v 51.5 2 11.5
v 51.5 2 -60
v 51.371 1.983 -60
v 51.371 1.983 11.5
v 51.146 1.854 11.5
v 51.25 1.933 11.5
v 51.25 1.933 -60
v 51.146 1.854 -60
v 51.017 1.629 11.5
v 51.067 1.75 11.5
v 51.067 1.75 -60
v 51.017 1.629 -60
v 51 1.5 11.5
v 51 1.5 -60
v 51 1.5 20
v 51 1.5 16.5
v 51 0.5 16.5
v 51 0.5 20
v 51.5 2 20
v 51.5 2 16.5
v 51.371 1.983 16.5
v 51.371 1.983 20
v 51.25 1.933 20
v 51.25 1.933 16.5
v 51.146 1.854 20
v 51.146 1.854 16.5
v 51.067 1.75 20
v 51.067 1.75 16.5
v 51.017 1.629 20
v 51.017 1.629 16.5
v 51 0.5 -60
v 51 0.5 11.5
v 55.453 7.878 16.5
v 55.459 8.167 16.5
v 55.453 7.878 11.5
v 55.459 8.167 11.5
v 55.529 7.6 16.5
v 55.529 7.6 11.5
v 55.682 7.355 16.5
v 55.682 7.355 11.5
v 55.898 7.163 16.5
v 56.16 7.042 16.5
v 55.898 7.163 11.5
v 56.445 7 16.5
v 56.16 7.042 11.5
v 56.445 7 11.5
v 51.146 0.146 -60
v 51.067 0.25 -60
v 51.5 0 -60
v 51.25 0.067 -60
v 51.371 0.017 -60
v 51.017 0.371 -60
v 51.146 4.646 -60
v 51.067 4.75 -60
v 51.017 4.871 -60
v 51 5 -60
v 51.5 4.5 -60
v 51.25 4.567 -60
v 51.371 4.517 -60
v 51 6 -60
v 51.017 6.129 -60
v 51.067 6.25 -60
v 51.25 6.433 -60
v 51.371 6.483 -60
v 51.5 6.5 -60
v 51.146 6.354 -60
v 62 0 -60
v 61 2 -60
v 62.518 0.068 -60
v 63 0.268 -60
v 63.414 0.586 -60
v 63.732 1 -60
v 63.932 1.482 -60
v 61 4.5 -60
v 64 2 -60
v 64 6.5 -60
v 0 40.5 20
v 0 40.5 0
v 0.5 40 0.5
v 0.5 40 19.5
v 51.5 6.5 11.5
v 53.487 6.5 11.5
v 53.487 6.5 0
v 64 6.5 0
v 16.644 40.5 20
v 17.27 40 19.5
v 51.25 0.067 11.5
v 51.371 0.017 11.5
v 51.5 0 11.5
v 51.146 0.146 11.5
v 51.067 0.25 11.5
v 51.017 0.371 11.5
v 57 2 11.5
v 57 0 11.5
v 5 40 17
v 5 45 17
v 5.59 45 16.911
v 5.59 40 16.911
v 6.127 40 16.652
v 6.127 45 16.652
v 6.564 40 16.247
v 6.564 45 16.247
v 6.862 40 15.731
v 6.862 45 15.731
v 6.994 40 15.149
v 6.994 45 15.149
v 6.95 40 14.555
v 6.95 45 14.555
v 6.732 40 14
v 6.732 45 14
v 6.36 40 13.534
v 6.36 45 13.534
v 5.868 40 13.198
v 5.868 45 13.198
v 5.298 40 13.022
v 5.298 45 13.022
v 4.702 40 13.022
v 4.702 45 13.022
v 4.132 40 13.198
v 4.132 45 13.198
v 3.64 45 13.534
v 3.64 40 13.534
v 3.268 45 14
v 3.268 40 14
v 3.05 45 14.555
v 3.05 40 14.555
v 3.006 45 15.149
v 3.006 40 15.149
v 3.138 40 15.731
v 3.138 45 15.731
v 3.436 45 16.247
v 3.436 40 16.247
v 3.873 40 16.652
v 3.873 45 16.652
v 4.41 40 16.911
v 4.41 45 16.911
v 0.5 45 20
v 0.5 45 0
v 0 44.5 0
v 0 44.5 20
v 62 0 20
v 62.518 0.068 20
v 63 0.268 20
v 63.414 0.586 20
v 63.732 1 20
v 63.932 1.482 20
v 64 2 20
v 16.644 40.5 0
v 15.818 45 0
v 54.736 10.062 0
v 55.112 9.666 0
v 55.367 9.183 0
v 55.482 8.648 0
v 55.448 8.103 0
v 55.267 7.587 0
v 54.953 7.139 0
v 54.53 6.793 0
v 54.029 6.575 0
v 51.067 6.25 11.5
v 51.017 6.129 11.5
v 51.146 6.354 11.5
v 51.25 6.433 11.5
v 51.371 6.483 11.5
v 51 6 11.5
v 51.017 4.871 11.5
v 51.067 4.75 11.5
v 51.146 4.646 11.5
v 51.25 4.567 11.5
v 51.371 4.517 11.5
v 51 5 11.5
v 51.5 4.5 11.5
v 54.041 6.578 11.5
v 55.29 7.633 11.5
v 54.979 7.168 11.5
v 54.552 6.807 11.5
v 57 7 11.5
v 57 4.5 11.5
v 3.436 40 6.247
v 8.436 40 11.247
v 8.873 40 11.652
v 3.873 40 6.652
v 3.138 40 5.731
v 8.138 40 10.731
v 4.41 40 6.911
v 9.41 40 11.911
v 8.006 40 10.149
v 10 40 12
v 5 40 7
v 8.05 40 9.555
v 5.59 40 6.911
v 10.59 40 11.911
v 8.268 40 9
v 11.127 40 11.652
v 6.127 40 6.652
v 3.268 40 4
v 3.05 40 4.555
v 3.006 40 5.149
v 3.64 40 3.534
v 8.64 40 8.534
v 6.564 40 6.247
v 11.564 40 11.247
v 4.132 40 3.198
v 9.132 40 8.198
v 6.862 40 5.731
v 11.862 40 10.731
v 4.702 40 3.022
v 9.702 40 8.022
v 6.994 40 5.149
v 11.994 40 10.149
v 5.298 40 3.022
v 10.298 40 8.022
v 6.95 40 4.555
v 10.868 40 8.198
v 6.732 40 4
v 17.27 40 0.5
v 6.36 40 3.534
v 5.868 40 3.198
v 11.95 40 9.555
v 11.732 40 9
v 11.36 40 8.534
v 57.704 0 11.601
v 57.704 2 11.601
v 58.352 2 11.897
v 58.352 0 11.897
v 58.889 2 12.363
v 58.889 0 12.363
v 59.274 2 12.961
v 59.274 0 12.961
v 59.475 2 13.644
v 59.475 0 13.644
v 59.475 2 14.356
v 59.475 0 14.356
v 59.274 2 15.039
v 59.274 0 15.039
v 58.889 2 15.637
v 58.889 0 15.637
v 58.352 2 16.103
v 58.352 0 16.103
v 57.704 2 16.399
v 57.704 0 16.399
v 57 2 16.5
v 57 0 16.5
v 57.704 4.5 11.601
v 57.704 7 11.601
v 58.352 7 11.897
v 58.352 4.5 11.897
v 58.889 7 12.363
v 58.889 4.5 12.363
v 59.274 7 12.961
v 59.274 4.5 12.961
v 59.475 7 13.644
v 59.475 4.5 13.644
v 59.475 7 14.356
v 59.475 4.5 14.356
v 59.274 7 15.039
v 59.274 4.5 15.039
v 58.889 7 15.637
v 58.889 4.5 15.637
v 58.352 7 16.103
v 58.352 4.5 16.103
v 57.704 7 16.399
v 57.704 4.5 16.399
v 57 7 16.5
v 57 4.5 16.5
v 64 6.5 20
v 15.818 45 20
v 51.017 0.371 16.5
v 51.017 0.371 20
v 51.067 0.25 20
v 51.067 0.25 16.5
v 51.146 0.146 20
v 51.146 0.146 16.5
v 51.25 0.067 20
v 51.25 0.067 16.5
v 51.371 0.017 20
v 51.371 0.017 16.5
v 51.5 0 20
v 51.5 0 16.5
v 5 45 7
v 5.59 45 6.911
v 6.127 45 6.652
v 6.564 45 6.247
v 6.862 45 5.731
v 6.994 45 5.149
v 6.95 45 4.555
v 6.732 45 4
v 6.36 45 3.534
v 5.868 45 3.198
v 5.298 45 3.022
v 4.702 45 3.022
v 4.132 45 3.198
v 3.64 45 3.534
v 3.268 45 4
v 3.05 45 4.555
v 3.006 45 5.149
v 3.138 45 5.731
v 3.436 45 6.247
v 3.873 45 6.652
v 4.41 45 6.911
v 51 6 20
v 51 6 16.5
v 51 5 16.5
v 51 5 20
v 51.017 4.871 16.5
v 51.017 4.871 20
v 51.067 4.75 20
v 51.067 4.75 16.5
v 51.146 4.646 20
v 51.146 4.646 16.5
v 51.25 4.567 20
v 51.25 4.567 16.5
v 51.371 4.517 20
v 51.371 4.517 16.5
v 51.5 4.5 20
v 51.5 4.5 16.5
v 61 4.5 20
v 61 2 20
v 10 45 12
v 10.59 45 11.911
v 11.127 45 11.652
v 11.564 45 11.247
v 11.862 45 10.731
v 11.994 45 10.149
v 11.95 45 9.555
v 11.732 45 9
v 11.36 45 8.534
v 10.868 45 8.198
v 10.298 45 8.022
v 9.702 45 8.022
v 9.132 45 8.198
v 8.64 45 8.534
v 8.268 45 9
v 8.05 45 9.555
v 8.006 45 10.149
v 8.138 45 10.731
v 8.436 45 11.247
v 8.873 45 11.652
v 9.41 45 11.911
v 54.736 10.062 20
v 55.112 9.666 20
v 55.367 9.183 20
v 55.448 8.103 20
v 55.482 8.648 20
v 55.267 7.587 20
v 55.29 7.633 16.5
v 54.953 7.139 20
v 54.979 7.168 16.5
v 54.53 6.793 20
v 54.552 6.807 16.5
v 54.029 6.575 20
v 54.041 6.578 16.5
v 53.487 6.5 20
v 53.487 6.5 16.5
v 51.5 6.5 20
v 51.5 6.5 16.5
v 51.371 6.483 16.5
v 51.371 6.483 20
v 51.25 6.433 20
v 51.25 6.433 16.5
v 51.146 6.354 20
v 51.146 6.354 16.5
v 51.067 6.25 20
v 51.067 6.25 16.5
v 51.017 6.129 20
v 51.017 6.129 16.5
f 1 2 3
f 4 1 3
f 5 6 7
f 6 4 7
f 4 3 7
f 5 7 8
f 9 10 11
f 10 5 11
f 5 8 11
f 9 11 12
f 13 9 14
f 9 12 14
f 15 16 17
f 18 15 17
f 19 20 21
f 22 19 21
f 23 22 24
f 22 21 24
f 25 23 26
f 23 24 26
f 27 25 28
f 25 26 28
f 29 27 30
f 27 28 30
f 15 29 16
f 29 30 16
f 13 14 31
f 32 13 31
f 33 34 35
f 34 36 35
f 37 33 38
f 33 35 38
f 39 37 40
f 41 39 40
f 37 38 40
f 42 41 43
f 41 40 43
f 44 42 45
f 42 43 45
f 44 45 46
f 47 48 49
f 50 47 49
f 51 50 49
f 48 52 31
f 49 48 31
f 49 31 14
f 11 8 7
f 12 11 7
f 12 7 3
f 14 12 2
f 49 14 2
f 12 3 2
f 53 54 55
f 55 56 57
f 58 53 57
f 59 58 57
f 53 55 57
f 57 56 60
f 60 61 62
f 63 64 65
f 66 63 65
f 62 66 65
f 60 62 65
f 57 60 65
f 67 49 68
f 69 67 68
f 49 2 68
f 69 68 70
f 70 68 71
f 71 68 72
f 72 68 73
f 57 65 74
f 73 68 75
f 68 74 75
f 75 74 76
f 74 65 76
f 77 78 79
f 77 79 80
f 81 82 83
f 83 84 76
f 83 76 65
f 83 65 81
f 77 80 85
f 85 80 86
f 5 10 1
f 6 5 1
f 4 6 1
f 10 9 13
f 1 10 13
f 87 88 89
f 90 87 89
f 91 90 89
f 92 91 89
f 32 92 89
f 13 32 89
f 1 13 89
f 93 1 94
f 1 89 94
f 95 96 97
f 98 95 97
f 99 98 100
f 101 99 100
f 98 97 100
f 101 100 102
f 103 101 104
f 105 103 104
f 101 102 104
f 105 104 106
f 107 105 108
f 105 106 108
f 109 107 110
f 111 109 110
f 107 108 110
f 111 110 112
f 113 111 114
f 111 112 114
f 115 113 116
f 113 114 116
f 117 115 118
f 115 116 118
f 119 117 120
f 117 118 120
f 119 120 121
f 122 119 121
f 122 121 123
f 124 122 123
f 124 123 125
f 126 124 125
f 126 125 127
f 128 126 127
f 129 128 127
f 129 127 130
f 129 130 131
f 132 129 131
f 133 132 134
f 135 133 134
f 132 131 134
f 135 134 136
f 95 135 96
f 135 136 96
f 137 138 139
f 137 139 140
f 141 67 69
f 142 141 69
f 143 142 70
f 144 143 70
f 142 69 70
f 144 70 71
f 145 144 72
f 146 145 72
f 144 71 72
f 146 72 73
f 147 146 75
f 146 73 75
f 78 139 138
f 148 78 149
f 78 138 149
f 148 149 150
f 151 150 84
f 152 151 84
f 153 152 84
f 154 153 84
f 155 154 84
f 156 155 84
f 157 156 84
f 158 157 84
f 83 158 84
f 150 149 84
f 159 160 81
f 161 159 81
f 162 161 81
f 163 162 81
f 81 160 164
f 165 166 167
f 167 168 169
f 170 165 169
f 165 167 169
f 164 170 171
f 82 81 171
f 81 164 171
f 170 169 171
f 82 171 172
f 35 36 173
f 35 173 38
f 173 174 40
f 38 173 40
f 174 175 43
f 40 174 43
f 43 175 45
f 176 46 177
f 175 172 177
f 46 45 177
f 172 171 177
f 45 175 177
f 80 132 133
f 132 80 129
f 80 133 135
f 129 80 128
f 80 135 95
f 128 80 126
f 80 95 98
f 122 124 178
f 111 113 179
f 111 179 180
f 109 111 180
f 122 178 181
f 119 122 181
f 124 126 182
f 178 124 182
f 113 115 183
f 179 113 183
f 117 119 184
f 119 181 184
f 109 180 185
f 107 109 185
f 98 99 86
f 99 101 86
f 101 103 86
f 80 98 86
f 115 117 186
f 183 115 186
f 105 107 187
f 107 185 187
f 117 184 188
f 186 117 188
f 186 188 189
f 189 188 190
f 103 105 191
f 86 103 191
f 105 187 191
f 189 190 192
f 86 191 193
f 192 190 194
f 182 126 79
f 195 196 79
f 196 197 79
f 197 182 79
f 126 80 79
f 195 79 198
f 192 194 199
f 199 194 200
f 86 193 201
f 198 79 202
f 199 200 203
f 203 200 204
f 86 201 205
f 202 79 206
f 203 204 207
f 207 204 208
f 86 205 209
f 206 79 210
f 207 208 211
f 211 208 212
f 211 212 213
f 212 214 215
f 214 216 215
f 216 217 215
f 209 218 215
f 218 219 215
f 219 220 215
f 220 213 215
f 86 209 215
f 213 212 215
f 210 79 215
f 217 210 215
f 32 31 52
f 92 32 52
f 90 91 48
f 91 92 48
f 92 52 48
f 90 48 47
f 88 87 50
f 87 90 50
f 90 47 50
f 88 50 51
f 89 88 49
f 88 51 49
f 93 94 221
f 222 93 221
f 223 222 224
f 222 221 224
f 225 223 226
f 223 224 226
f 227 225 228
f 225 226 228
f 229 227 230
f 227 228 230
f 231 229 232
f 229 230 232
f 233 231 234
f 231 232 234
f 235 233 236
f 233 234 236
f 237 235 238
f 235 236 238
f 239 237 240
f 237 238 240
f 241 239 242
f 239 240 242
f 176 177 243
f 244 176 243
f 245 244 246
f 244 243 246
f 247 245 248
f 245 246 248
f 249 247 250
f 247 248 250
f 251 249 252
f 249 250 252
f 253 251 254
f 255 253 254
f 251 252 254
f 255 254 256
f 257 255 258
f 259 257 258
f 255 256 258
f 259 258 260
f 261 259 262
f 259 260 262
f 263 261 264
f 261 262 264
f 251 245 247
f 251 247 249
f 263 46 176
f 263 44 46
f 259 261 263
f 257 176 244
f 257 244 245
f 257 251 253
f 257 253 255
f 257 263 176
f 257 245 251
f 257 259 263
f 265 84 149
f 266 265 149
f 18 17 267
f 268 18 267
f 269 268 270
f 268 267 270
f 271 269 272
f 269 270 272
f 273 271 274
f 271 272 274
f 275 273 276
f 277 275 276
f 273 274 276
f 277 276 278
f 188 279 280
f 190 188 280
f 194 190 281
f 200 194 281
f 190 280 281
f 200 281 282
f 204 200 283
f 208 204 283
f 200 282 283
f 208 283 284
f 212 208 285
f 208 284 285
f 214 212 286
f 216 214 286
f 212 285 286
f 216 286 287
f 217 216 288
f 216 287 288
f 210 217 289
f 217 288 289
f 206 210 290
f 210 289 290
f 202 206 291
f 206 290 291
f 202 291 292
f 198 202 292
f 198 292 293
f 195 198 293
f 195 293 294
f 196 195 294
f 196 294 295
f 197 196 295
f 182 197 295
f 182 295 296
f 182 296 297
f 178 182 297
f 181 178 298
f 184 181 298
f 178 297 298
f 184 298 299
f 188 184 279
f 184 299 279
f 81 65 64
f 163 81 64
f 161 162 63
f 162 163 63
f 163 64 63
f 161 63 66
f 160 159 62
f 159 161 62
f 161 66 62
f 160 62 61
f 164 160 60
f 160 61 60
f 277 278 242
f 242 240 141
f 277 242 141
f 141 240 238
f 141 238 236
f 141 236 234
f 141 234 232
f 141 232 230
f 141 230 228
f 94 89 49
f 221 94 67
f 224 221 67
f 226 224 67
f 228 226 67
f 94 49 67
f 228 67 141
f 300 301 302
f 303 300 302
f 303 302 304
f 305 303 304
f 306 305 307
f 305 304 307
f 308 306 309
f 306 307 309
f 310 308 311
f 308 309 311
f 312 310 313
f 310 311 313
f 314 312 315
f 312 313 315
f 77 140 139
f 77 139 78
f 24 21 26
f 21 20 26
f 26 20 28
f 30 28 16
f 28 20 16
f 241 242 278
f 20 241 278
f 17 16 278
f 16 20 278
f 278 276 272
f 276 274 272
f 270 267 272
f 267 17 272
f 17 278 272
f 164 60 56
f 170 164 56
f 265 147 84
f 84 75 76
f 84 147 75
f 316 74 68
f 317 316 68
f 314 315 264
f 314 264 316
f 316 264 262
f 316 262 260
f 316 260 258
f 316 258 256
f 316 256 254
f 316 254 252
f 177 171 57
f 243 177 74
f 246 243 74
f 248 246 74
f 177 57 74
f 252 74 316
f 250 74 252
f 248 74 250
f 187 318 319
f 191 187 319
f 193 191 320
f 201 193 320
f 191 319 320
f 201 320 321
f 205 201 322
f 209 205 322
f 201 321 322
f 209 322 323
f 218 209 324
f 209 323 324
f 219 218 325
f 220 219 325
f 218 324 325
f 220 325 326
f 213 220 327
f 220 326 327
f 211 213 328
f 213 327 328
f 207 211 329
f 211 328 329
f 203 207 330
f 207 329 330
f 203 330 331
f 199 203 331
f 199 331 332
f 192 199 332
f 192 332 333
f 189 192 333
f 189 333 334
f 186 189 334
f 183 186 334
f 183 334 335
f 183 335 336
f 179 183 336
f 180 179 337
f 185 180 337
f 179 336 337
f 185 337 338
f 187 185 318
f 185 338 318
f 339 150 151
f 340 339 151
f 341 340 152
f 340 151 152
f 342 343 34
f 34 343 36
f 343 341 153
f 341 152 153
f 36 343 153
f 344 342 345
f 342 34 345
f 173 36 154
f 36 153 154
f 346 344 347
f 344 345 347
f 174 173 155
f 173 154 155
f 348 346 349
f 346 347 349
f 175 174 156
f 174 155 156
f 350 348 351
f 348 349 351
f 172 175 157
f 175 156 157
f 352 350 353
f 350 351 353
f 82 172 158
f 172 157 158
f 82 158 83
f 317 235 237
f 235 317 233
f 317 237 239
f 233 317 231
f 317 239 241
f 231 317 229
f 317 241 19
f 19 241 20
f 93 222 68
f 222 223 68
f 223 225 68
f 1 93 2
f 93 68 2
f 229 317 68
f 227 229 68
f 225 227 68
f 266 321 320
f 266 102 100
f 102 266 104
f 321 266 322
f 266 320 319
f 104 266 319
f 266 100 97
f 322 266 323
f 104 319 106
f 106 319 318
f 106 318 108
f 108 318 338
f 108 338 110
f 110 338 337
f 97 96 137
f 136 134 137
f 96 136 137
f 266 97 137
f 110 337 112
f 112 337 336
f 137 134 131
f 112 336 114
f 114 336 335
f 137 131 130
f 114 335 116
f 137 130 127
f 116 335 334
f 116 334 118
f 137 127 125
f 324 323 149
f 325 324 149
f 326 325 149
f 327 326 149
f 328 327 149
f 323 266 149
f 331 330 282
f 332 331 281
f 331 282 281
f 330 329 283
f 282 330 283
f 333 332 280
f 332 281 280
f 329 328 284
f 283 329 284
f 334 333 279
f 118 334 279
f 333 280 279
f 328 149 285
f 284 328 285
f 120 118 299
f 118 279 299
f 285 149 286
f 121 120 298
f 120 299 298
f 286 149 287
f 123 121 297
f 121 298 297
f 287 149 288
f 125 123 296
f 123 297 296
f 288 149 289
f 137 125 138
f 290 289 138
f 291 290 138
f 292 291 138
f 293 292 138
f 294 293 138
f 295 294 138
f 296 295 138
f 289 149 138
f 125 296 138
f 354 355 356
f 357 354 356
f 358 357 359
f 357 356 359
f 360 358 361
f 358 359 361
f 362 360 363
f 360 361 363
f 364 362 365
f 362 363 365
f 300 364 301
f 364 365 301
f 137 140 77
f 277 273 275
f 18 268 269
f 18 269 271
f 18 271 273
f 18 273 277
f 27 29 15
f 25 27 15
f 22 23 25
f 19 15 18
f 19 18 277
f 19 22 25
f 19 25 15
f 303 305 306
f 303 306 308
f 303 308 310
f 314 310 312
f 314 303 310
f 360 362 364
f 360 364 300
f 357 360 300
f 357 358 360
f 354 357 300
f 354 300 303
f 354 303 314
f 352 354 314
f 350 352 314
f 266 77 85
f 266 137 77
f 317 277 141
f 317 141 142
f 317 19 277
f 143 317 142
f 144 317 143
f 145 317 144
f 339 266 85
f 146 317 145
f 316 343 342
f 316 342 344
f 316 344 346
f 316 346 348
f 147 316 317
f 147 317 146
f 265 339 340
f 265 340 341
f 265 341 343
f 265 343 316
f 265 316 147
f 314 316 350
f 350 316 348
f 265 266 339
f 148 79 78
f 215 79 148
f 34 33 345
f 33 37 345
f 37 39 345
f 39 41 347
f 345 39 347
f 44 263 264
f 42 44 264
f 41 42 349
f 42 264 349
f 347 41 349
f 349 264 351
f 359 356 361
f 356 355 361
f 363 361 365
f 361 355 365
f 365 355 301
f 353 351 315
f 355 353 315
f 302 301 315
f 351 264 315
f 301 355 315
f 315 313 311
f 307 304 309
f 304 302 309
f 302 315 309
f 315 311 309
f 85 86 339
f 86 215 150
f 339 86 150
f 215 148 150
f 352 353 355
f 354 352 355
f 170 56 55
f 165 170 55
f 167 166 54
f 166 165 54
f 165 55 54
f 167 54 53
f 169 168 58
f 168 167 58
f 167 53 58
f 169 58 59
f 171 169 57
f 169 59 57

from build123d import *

# Parameters (mm, degrees)
EXTRUDE_1_DEPTH     = 20
SKETCH_2_R          = 2.5
SKETCH_2_W          = 0.5
SKETCH_2_H          = 5
CUT_EXTRUDE_1_DEPTH = 7
FILLET_2_R          = 1
EXTRUDE_START       = 60
EXTRUDE_2_DEPTH     = 60
SKETCH_4_R          = 2
CUT_EXTRUDE_2_DEPTH = 5
CHAMFER_1_SIZE      = 0.5


with BuildPart() as part:
    # 草图1 → 凸台-拉伸1 (new body)
    with BuildSketch(Plane.XY):
        with BuildLine():
            Line((51.5, 0), (62, 0))
            ThreePointArc((62, 0), (63.414213562, 0.585786438), (64, 2))
            Line((64, 2), (64, 6.5))
            Line((64, 6.5), (15.818440015, 45))
            Line((15.818440015, 45), (0, 45))
            Line((0, 45), (0, 40))
            Line((0, 40), (17.27, 40))
            Line((17.27, 40), (54.735914555, 10.062453129))
            ThreePointArc((54.735914555, 10.062453129), (55.374865565, 7.838526742), (53.487419373, 6.5))
            Line((53.487419373, 6.5), (51.5, 6.5))
            ThreePointArc((51.5, 6.5), (51.146446609, 6.353553391), (51, 6))
            Line((51, 6), (51, 5))
            ThreePointArc((51, 5), (51.146446609, 4.646446609), (51.5, 4.5))
            Line((51.5, 4.5), (61, 4.5))
            Line((61, 4.5), (61, 2))
            Line((61, 2), (51.5, 2))
            ThreePointArc((51.5, 2), (51.146446609, 1.853553391), (51, 1.5))
            Line((51, 1.5), (51, 0.5))
            ThreePointArc((51, 0.5), (51.146446609, 0.146446609), (51.5, 0))
        make_face()
    extrude(amount=EXTRUDE_1_DEPTH)

    # 草图2 → 切除-拉伸1 (cut)
    with BuildSketch(Plane.XZ):
        with Locations((57, 14)):
            Circle(SKETCH_2_R)
        with BuildLine():
            Line((57, 16.5), (51.5, 16.5))
            Line((51.5, 16.5), (51.5, 11.5))
            Line((51.5, 11.5), (57, 11.5))
            ThreePointArc((57, 11.5), (54.5, 14), (57, 16.5))
        make_face()
        with Locations((51.25, 14)):
            Rectangle(SKETCH_2_W, SKETCH_2_H)
    extrude(amount=-CUT_EXTRUDE_1_DEPTH, mode=Mode.SUBTRACT)

    # 圆角2
    fillet_2_edges = [part.edges().sort_by_distance(p)[0] for p in [
        (54.810295028, 7, 14),
    ]]
    fillet(fillet_2_edges, radius=FILLET_2_R)

    # 草图3 → 凸台-拉伸2 (add)
    with BuildSketch(Plane(origin=(0, 0, 0), x_dir=(-1, 0, 0), z_dir=(0, 0, -1)).offset(EXTRUDE_START)):
        with BuildLine():
            Line((-64, 6.5), (-53.487419373, 6.5))
            Line((-53.487419373, 6.5), (-51.5, 6.5))
            ThreePointArc((-51.5, 6.5), (-51.146446609, 6.353553391), (-51, 6))
            Line((-51, 6), (-51, 5))
            ThreePointArc((-51, 5), (-51.146446609, 4.646446609), (-51.5, 4.5))
            Line((-51.5, 4.5), (-61, 4.5))
            Line((-61, 4.5), (-61, 2))
            Line((-61, 2), (-51.5, 2))
            ThreePointArc((-51.5, 2), (-51.146446609, 1.853553391), (-51, 1.5))
            Line((-51, 1.5), (-51, 0.5))
            ThreePointArc((-51, 0.5), (-51.146446609, 0.146446609), (-51.5, 0))
            Line((-51.5, 0), (-62, 0))
            ThreePointArc((-62, 0), (-63.414213562, 0.585786438), (-64, 2))
            Line((-64, 2), (-64, 6.5))
        make_face()
    extrude(amount=-EXTRUDE_2_DEPTH)

    # 草图4 → 切除-拉伸2 (cut)
    with BuildSketch(Plane(origin=(0, 45, 0), x_dir=(1, 0, 0), z_dir=(0, 1, 0))):
        with Locations(Location((5, -5, 0), (0, 0, 270))):
            Circle(SKETCH_4_R)
        with Locations(Location((5, -15, 0), (0, 0, 270))):
            Circle(SKETCH_4_R)
        with Locations(Location((10, -10, 0), (0, 0, 270))):
            Circle(SKETCH_4_R)
    extrude(amount=-CUT_EXTRUDE_2_DEPTH, mode=Mode.SUBTRACT)

    # 倒角1
    chamfer_1_edges = [part.edges().sort_by_distance(p)[0] for p in [
        (8.635, 40, 20),
        (8.635, 40, 0),
        (0, 40, 10),
        (0, 45, 10),
    ]]
    chamfer(chamfer_1_edges, length=CHAMFER_1_SIZE)


solid = part.part
